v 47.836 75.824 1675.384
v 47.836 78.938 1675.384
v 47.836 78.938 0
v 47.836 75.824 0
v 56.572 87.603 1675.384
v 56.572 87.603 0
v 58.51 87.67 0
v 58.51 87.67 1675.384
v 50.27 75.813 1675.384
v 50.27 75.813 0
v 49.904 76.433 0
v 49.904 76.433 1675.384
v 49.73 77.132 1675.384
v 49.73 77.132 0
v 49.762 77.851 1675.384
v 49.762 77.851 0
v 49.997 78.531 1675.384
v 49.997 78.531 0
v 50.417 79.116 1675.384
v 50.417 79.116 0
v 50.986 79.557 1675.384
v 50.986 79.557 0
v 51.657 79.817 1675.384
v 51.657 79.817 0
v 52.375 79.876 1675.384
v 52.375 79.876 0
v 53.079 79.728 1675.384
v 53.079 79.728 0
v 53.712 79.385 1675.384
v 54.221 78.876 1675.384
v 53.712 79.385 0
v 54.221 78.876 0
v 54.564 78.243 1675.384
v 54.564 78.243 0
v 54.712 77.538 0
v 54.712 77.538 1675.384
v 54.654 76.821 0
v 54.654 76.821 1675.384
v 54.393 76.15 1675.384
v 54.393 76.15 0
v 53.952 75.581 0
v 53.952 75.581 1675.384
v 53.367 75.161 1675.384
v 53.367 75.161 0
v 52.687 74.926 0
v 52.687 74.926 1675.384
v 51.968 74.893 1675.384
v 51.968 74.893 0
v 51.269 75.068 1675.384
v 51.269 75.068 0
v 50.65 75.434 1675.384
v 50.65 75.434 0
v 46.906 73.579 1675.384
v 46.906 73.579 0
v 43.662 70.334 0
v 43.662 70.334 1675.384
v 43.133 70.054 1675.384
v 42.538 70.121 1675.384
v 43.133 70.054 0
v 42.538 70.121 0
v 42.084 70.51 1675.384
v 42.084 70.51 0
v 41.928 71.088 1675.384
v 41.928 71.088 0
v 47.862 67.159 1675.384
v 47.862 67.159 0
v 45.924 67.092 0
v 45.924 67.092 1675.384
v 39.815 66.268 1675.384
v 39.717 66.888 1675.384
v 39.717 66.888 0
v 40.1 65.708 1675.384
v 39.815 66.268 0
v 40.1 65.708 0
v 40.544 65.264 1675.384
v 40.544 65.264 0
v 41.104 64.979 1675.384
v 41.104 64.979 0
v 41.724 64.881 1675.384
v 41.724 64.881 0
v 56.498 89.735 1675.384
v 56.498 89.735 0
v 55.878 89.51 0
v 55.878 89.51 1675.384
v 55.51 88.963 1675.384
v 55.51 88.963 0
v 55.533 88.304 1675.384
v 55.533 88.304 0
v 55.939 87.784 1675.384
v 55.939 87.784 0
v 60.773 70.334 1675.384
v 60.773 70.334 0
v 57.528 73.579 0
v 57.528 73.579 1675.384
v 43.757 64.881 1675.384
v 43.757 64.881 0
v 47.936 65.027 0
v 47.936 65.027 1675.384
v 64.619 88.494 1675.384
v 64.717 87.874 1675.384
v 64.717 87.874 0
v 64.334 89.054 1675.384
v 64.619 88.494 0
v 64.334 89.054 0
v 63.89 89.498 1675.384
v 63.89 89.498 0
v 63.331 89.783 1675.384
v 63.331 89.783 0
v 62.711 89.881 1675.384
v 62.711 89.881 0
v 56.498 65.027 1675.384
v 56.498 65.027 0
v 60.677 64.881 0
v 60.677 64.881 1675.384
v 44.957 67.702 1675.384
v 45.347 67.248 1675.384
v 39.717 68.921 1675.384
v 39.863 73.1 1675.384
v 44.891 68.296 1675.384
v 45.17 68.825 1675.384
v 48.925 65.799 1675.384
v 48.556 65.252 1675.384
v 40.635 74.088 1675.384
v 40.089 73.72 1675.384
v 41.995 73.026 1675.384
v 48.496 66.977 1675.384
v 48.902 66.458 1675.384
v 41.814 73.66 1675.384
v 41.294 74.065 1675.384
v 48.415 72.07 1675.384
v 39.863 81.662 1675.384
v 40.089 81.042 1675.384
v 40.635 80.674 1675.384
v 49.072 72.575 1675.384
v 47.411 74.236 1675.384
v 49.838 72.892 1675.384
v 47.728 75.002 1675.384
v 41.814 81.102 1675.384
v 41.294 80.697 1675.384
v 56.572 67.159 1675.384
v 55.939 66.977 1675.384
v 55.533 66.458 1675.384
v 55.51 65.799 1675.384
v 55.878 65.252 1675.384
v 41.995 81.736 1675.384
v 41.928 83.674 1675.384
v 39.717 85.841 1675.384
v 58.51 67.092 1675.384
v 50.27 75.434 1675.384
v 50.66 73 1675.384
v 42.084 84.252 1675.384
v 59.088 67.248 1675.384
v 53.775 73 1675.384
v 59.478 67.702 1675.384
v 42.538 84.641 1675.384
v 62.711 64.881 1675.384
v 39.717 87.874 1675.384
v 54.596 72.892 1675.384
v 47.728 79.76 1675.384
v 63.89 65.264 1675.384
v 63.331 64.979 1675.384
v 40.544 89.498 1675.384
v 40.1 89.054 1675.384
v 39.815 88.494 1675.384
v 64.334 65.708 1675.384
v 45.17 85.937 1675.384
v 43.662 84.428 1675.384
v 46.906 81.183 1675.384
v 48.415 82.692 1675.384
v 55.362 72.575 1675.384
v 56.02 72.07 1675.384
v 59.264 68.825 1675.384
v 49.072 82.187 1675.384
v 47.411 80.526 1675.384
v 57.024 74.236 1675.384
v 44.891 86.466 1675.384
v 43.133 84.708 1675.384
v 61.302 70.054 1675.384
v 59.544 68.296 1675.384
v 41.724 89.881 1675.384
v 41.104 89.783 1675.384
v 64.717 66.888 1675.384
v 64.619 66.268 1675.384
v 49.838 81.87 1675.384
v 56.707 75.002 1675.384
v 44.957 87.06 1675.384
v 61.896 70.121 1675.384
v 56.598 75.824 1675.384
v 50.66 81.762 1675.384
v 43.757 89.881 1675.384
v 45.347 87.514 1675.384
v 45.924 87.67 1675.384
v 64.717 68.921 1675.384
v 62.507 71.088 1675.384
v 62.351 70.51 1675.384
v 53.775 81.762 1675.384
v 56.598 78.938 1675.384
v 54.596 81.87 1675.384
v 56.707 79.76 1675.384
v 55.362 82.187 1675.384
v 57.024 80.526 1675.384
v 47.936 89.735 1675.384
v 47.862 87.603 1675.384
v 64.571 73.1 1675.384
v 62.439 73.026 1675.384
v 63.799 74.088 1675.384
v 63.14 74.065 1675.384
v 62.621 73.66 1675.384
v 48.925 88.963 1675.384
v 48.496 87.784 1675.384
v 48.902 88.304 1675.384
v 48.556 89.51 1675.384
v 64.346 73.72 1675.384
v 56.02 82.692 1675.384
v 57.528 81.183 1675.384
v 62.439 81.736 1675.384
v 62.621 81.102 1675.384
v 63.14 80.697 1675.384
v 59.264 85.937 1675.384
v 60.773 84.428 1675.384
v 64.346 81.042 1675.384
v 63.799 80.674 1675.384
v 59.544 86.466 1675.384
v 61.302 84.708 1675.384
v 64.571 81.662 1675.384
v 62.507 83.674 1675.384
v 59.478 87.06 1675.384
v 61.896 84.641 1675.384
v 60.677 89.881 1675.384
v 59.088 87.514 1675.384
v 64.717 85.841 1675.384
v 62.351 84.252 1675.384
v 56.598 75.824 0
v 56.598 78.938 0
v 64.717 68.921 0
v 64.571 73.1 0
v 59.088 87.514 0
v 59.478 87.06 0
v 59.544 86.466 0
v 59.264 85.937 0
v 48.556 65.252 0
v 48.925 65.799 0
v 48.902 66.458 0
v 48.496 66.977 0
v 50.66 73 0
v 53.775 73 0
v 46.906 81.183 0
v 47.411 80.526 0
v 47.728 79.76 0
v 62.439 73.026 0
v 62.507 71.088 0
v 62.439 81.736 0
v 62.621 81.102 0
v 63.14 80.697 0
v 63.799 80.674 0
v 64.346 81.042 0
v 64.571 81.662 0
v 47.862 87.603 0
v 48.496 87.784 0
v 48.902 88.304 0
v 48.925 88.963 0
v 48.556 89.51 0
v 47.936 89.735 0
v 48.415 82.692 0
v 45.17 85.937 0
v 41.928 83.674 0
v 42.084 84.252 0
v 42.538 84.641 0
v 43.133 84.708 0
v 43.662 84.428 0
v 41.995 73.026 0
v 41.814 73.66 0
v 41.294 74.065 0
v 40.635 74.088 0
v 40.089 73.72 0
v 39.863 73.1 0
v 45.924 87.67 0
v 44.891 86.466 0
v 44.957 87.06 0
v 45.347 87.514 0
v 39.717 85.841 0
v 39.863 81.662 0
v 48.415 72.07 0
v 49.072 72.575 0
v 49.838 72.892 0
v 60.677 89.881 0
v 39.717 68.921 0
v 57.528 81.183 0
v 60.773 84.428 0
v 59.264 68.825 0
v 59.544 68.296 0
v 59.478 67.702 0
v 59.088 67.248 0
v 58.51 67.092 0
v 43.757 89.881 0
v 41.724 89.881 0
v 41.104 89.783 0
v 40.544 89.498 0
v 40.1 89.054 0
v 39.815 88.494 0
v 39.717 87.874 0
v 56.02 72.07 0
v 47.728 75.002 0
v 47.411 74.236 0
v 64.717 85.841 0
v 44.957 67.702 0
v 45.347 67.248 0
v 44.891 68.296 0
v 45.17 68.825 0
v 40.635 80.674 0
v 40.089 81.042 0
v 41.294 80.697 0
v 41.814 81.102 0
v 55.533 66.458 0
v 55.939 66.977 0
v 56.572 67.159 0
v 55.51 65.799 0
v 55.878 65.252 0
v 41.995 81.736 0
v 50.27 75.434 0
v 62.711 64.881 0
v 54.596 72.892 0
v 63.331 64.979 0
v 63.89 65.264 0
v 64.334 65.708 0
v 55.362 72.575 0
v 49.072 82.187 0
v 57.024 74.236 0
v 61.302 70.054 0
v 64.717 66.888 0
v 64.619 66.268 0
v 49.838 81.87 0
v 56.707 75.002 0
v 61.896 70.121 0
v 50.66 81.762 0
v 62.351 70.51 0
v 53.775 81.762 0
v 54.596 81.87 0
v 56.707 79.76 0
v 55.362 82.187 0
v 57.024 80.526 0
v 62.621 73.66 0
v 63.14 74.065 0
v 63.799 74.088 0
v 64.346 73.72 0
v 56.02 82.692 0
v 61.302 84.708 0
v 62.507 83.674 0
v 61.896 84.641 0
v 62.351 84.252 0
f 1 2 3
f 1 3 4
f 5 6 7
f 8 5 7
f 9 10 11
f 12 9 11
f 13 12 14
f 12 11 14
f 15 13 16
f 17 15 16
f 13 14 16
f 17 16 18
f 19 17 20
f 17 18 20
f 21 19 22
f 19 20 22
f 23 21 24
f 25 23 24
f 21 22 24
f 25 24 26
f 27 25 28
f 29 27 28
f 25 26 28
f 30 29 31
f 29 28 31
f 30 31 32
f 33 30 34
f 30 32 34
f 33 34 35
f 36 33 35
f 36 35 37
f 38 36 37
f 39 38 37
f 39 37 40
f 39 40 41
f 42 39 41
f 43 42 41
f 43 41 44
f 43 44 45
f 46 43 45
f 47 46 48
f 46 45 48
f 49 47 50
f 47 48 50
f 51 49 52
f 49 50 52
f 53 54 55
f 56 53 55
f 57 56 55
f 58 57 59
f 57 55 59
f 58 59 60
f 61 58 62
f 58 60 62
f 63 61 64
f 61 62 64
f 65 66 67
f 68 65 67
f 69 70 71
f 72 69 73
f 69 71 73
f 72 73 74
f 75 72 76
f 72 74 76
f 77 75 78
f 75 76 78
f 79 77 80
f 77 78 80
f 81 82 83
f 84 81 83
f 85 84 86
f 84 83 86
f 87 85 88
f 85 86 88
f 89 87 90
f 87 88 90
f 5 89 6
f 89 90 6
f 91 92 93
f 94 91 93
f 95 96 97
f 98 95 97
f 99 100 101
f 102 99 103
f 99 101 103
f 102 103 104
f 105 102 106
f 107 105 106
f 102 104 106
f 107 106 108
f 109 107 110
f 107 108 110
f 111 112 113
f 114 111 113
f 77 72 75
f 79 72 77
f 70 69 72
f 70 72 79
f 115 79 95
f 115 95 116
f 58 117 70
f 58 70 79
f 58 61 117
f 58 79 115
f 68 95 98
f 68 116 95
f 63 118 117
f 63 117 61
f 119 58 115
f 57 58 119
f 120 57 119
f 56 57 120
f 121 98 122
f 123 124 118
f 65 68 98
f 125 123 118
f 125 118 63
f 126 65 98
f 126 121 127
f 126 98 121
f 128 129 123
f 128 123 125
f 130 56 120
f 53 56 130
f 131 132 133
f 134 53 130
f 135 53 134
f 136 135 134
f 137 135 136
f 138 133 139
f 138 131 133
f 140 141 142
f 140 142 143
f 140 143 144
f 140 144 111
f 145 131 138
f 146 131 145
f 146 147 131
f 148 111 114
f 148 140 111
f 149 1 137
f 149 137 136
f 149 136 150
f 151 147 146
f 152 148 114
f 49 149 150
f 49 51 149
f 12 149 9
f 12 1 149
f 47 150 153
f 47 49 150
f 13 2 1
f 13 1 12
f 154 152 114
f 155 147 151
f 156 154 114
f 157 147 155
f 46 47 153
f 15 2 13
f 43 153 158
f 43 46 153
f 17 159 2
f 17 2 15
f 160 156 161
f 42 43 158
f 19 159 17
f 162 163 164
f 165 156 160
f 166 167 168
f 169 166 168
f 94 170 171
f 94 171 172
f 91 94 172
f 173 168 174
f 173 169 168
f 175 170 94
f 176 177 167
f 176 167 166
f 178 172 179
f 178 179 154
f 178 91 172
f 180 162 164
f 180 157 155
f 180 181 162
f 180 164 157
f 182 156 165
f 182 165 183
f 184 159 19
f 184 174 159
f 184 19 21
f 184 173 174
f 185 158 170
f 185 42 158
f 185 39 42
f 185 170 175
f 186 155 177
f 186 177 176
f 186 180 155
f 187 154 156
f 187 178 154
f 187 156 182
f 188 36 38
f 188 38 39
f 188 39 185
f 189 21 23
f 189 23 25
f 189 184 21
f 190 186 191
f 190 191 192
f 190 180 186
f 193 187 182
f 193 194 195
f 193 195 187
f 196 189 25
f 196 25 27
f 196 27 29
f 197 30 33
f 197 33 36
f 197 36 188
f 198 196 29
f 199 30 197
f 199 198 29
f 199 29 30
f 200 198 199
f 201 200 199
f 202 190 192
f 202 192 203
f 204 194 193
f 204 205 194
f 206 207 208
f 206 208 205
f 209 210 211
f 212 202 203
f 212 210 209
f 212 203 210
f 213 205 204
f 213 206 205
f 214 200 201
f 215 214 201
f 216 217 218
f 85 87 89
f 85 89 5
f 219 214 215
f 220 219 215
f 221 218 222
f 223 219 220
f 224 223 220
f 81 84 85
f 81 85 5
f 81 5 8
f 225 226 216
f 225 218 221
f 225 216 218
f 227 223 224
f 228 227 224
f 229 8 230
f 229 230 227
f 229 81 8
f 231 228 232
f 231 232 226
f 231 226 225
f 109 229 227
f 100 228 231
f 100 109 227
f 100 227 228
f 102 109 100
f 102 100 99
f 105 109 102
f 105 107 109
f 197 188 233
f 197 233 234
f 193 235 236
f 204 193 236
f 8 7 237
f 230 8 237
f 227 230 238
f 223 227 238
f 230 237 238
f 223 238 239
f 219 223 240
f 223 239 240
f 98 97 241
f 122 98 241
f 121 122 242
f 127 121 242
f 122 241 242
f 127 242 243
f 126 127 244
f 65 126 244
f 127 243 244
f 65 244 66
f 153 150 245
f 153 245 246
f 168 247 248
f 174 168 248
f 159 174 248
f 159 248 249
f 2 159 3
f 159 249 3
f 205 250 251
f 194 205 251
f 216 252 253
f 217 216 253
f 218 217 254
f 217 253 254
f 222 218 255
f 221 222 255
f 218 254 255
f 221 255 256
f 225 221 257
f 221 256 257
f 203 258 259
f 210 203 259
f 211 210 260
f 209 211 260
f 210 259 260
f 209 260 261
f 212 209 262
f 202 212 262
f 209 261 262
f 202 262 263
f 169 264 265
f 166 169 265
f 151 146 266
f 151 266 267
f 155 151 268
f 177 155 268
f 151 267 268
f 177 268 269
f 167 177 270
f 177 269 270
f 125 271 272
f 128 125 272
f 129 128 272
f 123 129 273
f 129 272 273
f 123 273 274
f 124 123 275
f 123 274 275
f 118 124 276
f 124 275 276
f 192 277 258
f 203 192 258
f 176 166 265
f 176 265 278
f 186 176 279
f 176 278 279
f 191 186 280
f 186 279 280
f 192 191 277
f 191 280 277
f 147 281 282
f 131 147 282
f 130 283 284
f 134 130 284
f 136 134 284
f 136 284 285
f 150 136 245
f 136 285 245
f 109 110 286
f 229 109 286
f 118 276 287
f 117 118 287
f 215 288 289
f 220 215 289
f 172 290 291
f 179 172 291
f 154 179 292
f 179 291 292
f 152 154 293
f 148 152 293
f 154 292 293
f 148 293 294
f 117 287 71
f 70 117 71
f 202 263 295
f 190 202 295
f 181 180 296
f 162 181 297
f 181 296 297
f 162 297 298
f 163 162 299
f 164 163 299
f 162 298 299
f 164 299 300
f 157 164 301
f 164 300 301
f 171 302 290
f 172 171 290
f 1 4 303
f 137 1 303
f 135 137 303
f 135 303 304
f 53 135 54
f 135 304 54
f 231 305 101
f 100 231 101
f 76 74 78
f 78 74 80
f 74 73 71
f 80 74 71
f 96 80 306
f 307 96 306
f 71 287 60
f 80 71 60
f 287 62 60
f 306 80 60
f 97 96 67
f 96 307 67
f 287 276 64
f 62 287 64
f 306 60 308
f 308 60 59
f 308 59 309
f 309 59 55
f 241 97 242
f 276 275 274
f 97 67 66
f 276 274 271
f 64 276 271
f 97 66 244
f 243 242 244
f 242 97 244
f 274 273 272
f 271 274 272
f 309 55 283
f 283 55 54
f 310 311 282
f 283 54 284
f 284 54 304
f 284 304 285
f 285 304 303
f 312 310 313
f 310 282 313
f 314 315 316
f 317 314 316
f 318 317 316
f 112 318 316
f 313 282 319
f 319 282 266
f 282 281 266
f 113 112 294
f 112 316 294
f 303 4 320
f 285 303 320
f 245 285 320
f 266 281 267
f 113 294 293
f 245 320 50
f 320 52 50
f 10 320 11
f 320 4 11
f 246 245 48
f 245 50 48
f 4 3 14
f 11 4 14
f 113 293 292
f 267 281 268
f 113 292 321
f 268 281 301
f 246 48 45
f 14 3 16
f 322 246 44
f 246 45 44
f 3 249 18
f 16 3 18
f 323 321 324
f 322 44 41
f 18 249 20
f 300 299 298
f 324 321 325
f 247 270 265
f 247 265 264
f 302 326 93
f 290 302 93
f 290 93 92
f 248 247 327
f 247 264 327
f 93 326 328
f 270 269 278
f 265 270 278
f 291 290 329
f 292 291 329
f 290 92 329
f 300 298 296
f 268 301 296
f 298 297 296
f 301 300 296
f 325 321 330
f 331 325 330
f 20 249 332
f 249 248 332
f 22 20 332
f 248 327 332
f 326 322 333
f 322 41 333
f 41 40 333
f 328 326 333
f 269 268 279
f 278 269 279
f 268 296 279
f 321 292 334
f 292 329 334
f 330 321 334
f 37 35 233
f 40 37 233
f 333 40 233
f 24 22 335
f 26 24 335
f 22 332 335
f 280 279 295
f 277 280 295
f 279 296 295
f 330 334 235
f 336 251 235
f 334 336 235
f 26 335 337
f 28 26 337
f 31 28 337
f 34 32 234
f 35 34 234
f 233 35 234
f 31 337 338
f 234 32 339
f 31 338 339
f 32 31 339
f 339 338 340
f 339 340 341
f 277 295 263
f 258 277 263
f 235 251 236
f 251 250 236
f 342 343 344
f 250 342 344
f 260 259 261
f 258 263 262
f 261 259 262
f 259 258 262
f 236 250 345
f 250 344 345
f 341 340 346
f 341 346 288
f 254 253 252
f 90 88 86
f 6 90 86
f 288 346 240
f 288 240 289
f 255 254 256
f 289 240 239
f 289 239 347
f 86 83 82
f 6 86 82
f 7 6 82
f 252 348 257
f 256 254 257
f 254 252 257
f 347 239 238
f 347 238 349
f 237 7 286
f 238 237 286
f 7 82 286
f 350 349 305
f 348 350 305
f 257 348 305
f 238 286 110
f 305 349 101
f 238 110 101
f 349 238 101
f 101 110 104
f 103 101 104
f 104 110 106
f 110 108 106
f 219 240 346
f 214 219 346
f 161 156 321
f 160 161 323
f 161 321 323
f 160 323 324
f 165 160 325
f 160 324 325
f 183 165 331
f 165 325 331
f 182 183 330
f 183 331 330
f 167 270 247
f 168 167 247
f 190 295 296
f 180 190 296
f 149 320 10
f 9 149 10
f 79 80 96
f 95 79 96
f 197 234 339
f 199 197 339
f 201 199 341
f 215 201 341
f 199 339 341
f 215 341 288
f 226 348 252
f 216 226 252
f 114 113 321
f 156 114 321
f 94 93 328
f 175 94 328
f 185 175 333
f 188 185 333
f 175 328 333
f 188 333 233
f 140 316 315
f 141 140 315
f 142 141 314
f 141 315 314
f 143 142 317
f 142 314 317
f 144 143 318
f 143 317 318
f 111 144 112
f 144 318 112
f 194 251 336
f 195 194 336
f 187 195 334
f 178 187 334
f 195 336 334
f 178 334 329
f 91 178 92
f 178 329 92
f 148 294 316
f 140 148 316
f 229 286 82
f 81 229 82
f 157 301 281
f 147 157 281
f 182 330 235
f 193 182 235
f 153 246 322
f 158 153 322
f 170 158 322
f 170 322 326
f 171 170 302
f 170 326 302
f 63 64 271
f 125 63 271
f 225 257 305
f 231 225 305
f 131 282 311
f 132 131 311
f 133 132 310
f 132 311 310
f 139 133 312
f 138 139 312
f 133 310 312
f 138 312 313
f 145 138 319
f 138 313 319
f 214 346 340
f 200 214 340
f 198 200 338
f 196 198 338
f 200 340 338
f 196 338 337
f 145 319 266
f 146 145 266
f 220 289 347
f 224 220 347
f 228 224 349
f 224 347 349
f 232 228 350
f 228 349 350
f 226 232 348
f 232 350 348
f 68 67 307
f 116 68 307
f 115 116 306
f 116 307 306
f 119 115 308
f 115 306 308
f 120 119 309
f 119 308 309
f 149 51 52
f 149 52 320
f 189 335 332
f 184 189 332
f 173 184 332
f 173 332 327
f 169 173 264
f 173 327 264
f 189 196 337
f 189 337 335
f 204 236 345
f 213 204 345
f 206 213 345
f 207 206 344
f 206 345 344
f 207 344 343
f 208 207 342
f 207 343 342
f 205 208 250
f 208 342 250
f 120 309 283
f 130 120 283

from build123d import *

# Parameters (mm, degrees)
BOSS_EXTRUDE1_DEPTH = 1675.384


with BuildPart() as part:
    # Model → Boss-Extrude1 (new body)
    with BuildSketch(Plane.XY):
        with BuildLine():
            Line((50.659960212, 72.999871414), (53.774553856, 72.999871414))
            ThreePointArc((53.774553856, 72.999871414), (54.989573754, 72.758188929), (56.019617887, 72.069935444))
            Line((56.019617887, 72.069935444), (59.264200891, 68.825352439))
            ThreePointArc((59.264200891, 68.825352439), (59.477513437, 67.701802895), (58.510322513, 67.091550869))
            Line((58.510322513, 67.091550869), (56.572487817, 67.159221548))
            ThreePointArc((56.572487817, 67.159221548), (55.4691069, 66.130302197), (56.498026251, 65.026921279))
            Line((56.498026251, 65.026921279), (60.677257034, 64.880979325))
            Line((60.677257034, 64.880979325), (62.710657034, 64.880979325))
            ThreePointArc((62.710657034, 64.880979325), (64.129537501, 65.468698857), (64.717257034, 66.887579325))
            Line((64.717257034, 66.887579325), (64.717257034, 68.920979325))
            Line((64.717257034, 68.920979325), (64.57131508, 73.100210108))
            ThreePointArc((64.57131508, 73.100210108), (63.467934162, 74.129129459), (62.439014811, 73.025748542))
            Line((62.439014811, 73.025748542), (62.50668549, 71.087913846))
            ThreePointArc((62.50668549, 71.087913846), (61.896433464, 70.120722922), (60.77288392, 70.334035468))
            Line((60.77288392, 70.334035468), (57.528300915, 73.578618472))
            ThreePointArc((57.528300915, 73.578618472), (56.84004743, 74.608662605), (56.598364945, 75.823682503))
            Line((56.598364945, 75.823682503), (56.598364945, 78.938276147))
            ThreePointArc((56.598364945, 78.938276147), (56.84004743, 80.153296044), (57.528300915, 81.183340177))
            Line((57.528300915, 81.183340177), (60.77288392, 84.427923182))
            ThreePointArc((60.77288392, 84.427923182), (61.896433464, 84.641235728), (62.50668549, 83.674044803))
            Line((62.50668549, 83.674044803), (62.439014811, 81.736210108))
            ThreePointArc((62.439014811, 81.736210108), (63.467934162, 80.63282919), (64.57131508, 81.661748542))
            Line((64.57131508, 81.661748542), (64.717257034, 85.840979325))
            Line((64.717257034, 85.840979325), (64.717257034, 87.874379325))
            ThreePointArc((64.717257034, 87.874379325), (64.129537501, 89.293259792), (62.710657034, 89.880979325))
            Line((62.710657034, 89.880979325), (60.677257034, 89.880979325))
            Line((60.677257034, 89.880979325), (56.498026251, 89.73503737))
            ThreePointArc((56.498026251, 89.73503737), (55.4691069, 88.631656452), (56.572487817, 87.602737101))
            Line((56.572487817, 87.602737101), (58.510322513, 87.67040778))
            ThreePointArc((58.510322513, 87.67040778), (59.477513437, 87.060155754), (59.264200891, 85.93660621))
            Line((59.264200891, 85.93660621), (56.019617887, 82.692023205))
            ThreePointArc((56.019617887, 82.692023205), (54.989573754, 82.00376972), (53.774553856, 81.762087236))
            Line((53.774553856, 81.762087236), (50.659960212, 81.762087236))
            ThreePointArc((50.659960212, 81.762087236), (49.444940315, 82.00376972), (48.414896182, 82.692023205))
            Line((48.414896182, 82.692023205), (45.170313177, 85.93660621))
            ThreePointArc((45.170313177, 85.93660621), (44.957000631, 87.060155754), (45.924191556, 87.67040778))
            Line((45.924191556, 87.67040778), (47.862026251, 87.602737101))
            ThreePointArc((47.862026251, 87.602737101), (48.965407169, 88.631656452), (47.936487817, 89.73503737))
            Line((47.936487817, 89.73503737), (43.757257034, 89.880979325))
            Line((43.757257034, 89.880979325), (41.723857034, 89.880979325))
            ThreePointArc((41.723857034, 89.880979325), (40.304976567, 89.293259792), (39.717257034, 87.874379325))
            Line((39.717257034, 87.874379325), (39.717257034, 85.840979325))
            Line((39.717257034, 85.840979325), (39.863198989, 81.661748542))
            ThreePointArc((39.863198989, 81.661748542), (40.966579907, 80.63282919), (41.995499258, 81.736210108))
            Line((41.995499258, 81.736210108), (41.927828579, 83.674044803))
            ThreePointArc((41.927828579, 83.674044803), (42.538080605, 84.641235728), (43.661630149, 84.427923182))
            Line((43.661630149, 84.427923182), (46.906213154, 81.183340177))
            ThreePointArc((46.906213154, 81.183340177), (47.594466639, 80.153296044), (47.836149123, 78.938276147))
            Line((47.836149123, 78.938276147), (47.836149123, 75.823682503))
            ThreePointArc((47.836149123, 75.823682503), (47.594466639, 74.608662605), (46.906213154, 73.578618472))
            Line((46.906213154, 73.578618472), (43.661630149, 70.334035468))
            ThreePointArc((43.661630149, 70.334035468), (42.538080605, 70.120722922), (41.927828579, 71.087913846))
            Line((41.927828579, 71.087913846), (41.995499258, 73.025748542))
            ThreePointArc((41.995499258, 73.025748542), (40.966579907, 74.129129459), (39.863198989, 73.100210108))
            Line((39.863198989, 73.100210108), (39.717257034, 68.920979325))
            Line((39.717257034, 68.920979325), (39.717257034, 66.887579325))
            ThreePointArc((39.717257034, 66.887579325), (40.304976567, 65.468698857), (41.723857034, 64.880979325))
            Line((41.723857034, 64.880979325), (43.757257034, 64.880979325))
            Line((43.757257034, 64.880979325), (47.936487817, 65.026921279))
            ThreePointArc((47.936487817, 65.026921279), (48.965407169, 66.130302197), (47.862026251, 67.159221548))
            Line((47.862026251, 67.159221548), (45.924191556, 67.091550869))
            ThreePointArc((45.924191556, 67.091550869), (44.957000631, 67.701802895), (45.170313177, 68.825352439))
            Line((45.170313177, 68.825352439), (48.414896182, 72.069935444))
            ThreePointArc((48.414896182, 72.069935444), (49.444940315, 72.758188929), (50.659960212, 72.999871414))
        make_face()
        with BuildLine():
            Line((50.64953831, 75.433607249), (50.269884959, 75.433607249))
            Line((50.269884959, 75.433607249), (50.269884959, 75.8132606))
            ThreePointArc((50.269884959, 75.8132606), (53.985023987, 79.148746278), (50.64953831, 75.433607249))
        make_face(mode=Mode.SUBTRACT)
    extrude(amount=BOSS_EXTRUDE1_DEPTH)


solid = part.part
